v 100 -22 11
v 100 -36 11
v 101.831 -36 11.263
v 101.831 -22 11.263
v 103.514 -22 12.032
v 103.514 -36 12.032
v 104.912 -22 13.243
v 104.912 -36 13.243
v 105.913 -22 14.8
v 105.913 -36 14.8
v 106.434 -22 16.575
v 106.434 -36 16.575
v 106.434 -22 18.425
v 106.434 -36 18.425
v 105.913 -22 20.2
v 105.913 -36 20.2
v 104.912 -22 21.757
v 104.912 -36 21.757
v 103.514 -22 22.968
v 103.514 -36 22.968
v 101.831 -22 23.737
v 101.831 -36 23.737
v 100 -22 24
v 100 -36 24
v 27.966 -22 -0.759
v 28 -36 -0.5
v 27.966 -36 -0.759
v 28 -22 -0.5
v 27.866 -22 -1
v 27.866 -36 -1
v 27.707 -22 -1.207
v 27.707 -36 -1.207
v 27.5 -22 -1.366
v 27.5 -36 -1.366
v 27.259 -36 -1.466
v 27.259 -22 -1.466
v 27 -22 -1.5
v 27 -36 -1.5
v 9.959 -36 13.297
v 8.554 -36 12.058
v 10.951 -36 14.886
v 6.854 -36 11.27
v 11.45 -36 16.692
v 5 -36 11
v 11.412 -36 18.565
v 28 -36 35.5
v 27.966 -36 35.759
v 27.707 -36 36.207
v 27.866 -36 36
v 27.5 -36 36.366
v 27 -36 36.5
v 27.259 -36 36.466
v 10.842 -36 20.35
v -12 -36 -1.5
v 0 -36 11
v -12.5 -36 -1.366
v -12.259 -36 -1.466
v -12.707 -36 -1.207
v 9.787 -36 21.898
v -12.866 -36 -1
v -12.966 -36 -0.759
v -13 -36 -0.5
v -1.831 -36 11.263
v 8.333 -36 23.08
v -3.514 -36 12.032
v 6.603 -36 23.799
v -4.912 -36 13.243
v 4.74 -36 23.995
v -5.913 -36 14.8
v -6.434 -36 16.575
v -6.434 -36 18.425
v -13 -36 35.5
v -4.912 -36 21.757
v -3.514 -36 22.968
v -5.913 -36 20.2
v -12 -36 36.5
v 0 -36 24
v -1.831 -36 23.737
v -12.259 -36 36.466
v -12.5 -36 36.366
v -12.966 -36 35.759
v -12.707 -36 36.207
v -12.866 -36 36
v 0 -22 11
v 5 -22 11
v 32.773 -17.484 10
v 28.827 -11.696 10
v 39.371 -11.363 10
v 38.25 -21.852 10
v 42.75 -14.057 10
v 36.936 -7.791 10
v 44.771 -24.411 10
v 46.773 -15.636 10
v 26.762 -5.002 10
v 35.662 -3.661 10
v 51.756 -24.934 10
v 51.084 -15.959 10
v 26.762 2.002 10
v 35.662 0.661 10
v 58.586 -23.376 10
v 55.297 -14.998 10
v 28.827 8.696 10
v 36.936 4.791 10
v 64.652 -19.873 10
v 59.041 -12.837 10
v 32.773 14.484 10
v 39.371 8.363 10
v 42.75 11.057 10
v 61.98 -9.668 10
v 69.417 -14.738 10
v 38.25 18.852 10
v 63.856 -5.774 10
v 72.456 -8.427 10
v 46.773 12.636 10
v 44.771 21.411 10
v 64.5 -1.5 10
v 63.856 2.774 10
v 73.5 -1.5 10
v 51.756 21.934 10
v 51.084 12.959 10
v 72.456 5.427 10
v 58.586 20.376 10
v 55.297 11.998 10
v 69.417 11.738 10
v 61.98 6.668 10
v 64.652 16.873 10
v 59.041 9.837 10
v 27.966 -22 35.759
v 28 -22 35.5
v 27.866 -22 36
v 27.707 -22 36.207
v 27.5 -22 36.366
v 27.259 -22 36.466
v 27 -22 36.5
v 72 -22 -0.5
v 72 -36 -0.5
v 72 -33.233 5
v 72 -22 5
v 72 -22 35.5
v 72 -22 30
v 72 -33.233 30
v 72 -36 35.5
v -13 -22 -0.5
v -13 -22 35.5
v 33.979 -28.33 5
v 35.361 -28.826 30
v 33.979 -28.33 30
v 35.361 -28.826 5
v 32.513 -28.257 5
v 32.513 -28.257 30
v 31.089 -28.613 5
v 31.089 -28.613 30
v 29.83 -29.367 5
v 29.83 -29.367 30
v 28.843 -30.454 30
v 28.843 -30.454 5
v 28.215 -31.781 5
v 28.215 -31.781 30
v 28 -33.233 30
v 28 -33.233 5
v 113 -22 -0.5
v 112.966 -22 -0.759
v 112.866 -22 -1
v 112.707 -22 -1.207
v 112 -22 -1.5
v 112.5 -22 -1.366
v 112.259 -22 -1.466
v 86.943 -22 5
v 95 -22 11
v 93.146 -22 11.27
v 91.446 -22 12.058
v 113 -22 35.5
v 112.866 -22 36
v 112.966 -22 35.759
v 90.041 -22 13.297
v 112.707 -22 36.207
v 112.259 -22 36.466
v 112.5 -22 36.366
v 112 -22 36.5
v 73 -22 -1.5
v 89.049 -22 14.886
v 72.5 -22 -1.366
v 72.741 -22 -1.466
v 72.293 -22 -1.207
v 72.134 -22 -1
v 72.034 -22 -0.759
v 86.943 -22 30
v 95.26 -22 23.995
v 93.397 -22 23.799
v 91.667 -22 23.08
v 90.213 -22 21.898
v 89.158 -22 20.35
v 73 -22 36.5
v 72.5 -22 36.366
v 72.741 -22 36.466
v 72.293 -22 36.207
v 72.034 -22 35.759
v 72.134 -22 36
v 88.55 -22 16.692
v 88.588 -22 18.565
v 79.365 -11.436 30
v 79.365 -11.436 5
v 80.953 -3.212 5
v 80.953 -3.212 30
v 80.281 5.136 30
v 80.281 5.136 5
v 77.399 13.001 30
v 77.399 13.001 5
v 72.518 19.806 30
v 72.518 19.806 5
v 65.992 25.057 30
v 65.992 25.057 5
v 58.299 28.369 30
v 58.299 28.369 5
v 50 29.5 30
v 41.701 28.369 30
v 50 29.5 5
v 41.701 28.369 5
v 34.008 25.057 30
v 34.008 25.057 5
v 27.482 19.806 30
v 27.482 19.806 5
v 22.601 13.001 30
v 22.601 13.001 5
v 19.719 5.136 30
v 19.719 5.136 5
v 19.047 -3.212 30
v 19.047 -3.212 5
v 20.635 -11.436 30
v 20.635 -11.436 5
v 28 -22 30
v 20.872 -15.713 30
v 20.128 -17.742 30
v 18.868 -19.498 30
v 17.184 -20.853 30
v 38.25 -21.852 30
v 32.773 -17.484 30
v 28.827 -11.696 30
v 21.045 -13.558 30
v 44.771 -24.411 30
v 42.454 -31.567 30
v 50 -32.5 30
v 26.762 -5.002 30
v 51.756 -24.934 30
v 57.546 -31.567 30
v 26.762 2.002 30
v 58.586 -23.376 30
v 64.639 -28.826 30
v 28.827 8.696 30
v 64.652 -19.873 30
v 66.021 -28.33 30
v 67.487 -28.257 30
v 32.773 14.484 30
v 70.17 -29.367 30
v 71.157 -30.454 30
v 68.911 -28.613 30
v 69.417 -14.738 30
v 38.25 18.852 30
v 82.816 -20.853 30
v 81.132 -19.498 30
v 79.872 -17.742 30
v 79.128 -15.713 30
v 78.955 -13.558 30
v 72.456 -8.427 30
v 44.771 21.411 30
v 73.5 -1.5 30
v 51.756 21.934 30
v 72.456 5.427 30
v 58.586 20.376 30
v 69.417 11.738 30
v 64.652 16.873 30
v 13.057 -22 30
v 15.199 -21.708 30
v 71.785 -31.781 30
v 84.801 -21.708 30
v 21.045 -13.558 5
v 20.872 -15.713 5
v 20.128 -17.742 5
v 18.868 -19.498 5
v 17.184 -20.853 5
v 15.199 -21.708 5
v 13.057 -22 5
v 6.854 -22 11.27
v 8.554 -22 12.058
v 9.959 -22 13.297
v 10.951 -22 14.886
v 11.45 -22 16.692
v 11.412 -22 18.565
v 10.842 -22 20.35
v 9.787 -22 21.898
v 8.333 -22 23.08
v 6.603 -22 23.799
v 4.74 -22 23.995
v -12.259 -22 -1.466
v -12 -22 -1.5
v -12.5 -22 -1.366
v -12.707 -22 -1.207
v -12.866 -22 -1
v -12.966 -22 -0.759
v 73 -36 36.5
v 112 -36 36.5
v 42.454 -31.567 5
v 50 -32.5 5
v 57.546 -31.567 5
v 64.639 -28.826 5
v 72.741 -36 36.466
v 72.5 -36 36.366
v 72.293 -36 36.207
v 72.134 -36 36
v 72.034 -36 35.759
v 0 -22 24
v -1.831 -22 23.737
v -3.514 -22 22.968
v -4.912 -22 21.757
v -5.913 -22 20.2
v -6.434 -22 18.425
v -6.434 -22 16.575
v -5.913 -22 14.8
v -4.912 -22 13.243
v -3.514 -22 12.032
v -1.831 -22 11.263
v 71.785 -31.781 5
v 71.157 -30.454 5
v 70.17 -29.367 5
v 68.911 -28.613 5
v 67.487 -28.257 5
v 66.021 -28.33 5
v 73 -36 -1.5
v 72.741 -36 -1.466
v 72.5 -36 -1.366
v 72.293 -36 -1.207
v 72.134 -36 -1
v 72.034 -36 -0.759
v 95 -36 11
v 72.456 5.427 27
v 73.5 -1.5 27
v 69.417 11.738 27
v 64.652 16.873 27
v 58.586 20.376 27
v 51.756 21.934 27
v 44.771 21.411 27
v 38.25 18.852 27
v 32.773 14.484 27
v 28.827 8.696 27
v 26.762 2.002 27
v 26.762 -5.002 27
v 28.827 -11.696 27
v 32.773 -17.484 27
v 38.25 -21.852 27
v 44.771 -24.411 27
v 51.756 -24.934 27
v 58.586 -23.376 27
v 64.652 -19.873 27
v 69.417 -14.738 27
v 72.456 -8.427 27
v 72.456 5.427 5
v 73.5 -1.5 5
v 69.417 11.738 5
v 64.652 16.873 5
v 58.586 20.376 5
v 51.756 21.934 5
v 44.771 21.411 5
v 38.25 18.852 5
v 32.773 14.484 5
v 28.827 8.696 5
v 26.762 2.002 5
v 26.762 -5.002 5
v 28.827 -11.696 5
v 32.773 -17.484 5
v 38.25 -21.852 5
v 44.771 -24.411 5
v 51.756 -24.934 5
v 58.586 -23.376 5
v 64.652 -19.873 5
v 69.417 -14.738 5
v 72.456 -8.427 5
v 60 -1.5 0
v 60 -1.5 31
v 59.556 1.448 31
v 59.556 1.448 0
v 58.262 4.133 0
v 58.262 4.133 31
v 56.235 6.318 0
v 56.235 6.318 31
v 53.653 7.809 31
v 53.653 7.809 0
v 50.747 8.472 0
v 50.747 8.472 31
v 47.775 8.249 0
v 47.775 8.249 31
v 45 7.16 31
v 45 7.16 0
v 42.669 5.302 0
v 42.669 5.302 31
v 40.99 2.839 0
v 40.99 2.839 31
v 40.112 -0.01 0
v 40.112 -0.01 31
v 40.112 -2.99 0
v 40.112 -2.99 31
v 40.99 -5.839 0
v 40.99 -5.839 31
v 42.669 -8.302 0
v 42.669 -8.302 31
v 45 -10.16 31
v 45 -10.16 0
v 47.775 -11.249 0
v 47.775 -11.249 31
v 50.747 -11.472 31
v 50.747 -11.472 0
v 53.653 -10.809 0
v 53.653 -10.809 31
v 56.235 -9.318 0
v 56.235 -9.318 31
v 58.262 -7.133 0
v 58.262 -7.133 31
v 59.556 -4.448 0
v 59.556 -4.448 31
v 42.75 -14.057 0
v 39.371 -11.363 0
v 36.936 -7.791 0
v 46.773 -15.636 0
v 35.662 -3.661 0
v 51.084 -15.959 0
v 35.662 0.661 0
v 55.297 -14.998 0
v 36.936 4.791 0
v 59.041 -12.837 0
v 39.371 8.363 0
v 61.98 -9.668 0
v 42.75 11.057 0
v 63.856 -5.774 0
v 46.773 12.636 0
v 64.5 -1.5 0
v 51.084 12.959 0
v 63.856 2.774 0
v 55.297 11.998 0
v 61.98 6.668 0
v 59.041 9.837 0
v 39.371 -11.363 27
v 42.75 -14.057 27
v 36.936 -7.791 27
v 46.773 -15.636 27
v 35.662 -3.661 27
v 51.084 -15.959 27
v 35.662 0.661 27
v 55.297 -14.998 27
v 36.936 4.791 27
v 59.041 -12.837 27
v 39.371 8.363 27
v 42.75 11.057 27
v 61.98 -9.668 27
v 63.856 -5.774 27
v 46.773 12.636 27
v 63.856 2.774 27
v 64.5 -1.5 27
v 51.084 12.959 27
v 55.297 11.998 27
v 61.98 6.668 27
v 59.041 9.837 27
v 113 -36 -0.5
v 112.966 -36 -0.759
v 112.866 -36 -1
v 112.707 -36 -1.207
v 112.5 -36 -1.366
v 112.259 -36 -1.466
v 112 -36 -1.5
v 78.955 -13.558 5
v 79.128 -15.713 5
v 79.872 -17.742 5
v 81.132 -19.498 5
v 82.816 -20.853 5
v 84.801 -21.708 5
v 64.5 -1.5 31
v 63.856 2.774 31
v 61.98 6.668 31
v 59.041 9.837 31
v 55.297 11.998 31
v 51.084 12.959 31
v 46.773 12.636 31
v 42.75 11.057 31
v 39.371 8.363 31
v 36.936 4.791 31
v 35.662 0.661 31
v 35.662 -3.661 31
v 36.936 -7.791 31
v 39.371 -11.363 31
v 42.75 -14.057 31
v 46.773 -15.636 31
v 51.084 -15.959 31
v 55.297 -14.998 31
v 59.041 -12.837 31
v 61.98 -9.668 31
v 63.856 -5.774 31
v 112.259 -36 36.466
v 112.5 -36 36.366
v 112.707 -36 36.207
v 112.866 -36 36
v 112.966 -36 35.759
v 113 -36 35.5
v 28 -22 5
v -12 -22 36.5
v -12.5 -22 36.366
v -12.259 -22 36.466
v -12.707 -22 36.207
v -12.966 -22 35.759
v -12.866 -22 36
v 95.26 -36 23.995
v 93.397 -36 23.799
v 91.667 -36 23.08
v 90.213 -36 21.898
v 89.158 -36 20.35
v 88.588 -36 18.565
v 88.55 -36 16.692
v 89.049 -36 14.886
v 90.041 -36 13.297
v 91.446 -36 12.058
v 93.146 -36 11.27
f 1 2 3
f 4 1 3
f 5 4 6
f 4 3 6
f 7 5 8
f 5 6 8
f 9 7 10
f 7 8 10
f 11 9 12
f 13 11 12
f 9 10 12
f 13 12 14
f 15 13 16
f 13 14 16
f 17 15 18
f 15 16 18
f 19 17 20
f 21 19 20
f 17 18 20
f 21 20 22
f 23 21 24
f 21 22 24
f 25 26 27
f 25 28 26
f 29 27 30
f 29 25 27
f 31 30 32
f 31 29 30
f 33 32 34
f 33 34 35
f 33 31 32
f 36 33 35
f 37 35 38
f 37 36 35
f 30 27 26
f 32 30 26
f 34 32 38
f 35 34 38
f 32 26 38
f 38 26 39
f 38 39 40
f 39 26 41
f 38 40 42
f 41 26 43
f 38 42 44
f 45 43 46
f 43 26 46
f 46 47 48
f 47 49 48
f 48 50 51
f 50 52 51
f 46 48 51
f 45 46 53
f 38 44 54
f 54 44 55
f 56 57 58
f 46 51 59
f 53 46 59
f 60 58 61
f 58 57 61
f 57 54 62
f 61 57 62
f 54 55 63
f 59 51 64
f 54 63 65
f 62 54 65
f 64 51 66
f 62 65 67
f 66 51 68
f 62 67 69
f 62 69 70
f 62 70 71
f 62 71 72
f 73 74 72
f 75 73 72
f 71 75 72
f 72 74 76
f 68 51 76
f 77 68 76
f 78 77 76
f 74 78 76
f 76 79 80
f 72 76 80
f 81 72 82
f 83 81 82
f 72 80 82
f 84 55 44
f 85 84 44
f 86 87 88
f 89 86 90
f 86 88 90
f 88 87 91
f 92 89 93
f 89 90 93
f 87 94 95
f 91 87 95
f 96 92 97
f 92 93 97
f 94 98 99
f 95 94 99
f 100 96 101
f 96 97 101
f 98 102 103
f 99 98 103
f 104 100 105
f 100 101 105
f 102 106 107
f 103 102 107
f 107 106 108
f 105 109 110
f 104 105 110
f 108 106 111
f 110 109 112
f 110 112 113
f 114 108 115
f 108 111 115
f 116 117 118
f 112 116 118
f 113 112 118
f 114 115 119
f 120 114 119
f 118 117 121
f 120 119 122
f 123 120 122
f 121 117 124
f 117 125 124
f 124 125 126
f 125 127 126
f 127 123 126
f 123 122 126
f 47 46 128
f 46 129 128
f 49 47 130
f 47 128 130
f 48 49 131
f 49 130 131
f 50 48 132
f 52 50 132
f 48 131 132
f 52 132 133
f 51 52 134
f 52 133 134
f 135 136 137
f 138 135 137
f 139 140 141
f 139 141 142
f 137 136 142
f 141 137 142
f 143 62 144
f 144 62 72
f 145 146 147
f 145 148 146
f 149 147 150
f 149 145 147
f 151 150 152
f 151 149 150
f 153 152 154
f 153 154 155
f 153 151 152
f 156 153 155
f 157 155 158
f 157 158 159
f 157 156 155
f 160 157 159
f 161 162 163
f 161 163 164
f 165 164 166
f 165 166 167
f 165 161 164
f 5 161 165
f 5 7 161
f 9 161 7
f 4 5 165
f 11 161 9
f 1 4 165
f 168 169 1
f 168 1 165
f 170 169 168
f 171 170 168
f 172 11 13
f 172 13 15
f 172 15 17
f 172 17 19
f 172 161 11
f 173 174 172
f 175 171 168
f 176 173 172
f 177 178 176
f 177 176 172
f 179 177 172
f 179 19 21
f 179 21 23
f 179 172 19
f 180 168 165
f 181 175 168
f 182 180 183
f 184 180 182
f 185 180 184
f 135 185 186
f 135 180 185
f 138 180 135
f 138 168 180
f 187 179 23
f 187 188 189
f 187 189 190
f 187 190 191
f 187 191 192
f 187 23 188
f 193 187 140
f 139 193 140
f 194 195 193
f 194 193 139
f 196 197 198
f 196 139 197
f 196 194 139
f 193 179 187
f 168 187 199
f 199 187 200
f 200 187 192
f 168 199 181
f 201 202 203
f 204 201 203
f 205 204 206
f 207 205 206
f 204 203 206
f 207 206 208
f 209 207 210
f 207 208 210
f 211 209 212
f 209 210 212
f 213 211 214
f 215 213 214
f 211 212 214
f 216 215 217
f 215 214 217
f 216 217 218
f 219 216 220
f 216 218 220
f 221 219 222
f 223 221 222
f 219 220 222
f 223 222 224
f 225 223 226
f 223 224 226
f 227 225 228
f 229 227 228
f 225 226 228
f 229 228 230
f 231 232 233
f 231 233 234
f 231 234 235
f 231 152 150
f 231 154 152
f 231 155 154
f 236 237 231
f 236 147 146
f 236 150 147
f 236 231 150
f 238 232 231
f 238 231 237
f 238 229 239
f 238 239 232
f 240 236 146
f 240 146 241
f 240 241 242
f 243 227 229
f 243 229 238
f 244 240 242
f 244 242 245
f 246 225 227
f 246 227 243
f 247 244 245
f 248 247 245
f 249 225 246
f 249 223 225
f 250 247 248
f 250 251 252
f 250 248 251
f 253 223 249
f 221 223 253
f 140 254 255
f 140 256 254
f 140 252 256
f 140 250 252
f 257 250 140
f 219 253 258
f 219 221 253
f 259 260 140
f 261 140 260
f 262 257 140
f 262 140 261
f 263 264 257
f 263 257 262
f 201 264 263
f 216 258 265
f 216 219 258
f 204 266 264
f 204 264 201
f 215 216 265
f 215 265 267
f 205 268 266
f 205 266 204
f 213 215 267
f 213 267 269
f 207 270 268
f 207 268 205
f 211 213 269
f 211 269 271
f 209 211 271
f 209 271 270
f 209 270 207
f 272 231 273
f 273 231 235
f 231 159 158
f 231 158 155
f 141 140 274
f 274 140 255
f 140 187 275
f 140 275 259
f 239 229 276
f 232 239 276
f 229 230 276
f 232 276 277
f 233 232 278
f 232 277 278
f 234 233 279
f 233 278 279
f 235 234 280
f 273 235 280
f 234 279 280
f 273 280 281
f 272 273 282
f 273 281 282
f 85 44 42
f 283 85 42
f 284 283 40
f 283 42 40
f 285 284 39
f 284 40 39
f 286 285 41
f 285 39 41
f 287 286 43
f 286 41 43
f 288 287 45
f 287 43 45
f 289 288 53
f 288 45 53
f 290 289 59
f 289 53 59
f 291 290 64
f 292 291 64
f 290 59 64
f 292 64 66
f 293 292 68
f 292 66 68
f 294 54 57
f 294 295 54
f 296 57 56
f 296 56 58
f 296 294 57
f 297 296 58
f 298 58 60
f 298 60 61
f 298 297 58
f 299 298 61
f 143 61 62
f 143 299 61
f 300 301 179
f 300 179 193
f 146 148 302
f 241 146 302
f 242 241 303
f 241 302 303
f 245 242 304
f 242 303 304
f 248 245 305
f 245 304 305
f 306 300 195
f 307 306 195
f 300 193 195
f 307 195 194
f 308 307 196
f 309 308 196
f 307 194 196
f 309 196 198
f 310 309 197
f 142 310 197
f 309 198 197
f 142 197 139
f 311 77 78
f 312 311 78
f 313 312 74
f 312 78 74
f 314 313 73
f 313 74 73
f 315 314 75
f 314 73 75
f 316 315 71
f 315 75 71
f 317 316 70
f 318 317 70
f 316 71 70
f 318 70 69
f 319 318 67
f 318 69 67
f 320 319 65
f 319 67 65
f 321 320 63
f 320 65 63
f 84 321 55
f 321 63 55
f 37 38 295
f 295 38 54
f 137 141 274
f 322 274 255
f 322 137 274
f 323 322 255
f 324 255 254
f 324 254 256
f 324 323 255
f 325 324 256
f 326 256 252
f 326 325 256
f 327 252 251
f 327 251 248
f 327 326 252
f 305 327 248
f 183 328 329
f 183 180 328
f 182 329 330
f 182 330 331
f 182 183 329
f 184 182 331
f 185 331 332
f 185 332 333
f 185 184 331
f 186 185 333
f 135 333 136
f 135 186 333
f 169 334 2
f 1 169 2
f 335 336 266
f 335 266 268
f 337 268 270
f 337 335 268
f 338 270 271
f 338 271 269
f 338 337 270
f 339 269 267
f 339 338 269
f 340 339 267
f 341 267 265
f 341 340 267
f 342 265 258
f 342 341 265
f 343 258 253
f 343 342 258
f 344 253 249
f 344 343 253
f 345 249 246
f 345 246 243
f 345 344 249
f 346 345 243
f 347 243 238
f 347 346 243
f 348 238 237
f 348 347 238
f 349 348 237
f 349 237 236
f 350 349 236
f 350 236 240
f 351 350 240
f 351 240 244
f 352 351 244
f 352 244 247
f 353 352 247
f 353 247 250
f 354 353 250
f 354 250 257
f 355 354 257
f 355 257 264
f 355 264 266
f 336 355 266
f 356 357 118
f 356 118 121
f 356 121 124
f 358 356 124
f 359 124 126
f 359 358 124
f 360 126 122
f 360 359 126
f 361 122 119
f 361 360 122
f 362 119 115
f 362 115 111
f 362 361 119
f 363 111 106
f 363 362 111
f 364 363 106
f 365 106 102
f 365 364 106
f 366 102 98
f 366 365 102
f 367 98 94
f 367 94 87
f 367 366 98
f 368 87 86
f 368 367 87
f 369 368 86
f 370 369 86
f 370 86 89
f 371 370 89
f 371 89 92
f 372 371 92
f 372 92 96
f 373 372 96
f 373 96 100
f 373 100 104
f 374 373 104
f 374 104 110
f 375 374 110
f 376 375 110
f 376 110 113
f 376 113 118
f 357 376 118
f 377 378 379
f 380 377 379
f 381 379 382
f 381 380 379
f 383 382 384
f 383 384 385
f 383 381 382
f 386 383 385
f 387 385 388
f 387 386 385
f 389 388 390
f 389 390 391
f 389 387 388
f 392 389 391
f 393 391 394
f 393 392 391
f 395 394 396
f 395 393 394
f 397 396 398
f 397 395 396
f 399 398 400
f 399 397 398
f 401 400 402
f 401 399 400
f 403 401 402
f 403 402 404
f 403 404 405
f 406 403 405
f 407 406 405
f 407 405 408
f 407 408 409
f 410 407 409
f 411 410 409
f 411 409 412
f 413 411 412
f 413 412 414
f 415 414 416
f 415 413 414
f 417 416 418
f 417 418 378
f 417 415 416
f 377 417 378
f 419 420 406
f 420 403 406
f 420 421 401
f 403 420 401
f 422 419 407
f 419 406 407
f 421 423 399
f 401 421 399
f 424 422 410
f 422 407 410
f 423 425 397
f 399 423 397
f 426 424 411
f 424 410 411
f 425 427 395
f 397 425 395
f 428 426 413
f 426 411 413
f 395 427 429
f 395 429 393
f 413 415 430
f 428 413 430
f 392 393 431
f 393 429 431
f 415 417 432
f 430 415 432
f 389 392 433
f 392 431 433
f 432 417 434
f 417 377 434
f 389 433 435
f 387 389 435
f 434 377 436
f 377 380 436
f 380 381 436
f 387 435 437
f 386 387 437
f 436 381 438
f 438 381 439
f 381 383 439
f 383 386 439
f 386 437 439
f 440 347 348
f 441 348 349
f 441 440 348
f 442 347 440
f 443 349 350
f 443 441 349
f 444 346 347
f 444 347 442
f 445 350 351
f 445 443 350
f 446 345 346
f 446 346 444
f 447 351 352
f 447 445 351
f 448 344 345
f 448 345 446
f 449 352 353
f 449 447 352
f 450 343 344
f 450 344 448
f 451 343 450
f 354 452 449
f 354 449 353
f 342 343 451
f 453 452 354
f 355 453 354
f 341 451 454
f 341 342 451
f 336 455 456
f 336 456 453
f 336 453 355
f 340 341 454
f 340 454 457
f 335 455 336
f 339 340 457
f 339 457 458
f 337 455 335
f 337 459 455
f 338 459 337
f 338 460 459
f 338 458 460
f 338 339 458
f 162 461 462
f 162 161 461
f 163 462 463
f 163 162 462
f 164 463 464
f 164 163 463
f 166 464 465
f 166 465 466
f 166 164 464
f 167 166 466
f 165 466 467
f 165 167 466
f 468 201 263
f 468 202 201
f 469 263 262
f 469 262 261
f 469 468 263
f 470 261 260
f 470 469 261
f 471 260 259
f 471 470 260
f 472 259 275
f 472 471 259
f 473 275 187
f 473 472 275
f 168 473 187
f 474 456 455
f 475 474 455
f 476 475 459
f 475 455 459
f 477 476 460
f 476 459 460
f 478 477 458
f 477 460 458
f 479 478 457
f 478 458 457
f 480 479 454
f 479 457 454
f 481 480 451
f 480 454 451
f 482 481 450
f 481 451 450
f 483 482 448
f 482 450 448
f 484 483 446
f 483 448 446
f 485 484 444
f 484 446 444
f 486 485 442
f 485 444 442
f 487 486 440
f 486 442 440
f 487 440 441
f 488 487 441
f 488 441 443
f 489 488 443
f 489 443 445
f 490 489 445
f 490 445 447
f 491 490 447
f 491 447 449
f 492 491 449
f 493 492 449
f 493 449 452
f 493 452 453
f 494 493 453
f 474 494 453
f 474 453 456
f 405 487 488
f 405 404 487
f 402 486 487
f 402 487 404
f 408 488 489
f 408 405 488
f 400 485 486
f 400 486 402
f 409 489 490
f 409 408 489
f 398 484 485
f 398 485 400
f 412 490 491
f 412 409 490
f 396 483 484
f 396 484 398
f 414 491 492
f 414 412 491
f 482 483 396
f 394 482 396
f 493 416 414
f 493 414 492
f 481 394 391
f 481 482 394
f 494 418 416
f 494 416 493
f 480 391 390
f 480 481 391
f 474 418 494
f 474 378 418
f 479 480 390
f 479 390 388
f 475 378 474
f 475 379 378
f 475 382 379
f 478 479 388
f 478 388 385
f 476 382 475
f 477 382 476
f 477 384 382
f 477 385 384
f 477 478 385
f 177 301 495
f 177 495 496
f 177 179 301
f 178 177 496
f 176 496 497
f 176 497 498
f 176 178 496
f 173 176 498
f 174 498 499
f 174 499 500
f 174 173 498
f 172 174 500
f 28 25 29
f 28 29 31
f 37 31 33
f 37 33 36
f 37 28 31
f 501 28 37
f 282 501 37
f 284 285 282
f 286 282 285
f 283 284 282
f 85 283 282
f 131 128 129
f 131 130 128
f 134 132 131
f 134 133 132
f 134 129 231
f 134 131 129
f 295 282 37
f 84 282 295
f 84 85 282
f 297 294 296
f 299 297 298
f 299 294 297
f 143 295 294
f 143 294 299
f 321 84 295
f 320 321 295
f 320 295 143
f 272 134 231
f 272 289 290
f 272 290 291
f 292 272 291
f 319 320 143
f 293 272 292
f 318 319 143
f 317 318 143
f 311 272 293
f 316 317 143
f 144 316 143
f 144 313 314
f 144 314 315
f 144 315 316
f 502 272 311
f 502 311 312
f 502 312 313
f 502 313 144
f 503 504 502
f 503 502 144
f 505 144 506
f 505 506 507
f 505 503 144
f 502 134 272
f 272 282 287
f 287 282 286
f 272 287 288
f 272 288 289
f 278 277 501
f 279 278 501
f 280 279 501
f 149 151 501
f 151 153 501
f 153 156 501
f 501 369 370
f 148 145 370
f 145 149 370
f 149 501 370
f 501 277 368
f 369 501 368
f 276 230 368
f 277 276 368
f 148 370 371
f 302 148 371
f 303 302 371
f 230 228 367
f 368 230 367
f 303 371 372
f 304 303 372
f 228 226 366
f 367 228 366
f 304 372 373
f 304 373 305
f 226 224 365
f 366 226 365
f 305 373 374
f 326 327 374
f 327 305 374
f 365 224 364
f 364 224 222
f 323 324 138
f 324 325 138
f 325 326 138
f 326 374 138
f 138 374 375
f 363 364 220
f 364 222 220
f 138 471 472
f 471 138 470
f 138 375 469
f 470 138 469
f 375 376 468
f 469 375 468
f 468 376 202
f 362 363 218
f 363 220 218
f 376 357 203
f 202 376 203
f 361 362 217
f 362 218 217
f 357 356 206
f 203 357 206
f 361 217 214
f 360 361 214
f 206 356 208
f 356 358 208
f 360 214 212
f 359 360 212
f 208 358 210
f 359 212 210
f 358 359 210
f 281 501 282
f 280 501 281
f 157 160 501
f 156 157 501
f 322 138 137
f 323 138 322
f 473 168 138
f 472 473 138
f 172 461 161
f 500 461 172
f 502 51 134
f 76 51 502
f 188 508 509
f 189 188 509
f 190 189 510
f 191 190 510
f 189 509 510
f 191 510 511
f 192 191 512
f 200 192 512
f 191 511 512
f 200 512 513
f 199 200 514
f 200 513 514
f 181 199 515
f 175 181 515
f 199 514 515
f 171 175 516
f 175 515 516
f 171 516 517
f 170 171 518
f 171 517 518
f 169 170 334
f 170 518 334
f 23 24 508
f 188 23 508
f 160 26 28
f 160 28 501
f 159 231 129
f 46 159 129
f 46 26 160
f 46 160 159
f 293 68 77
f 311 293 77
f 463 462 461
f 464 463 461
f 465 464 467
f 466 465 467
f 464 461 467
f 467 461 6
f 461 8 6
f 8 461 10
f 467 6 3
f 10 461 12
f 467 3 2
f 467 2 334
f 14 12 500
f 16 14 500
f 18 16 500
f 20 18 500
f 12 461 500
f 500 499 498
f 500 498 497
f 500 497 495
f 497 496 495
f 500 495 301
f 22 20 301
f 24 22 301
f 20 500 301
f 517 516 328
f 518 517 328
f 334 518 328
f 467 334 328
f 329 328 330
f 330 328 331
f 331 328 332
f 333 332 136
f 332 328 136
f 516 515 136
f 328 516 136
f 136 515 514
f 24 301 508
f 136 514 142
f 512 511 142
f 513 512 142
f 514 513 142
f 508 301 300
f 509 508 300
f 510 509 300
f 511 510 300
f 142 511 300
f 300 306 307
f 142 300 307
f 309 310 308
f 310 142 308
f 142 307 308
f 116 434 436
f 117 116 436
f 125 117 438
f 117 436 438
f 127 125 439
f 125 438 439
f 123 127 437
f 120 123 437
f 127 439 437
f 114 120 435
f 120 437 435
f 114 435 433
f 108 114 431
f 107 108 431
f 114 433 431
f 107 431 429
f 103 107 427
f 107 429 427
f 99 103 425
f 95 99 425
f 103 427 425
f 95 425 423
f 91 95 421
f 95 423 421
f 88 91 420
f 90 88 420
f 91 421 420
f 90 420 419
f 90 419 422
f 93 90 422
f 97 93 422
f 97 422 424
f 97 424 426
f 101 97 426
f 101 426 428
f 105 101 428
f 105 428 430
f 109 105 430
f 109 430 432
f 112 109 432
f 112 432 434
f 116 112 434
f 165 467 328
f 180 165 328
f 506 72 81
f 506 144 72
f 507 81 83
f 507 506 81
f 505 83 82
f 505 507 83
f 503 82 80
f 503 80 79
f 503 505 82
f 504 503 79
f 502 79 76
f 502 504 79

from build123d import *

# Parameters (mm, degrees)
SKETCH_8_R      = 14.5
SKETCH_8_R_2    = 10
EXTRUDE_1_DEPTH = 31
SKETCH_10_R     = 23.5
SKETCH_10_R_2   = 14.5
EXTRUDE_2_DEPTH = 17
EXTRUDE_START   = -5
SKETCH_11_R     = 31
SKETCH_11_R_2   = 23.5
EXTRUDE_3_DEPTH = 25
SKETCH_13_W     = 41
SKETCH_13_H     = 38
EXTRUDE_4_DEPTH = 14
FILLET_1_R      = 8
FILLET_2_R      = 5
FILLET_3_R      = 5
FILLET_4_R      = 8
FILLET_5_R      = 1
FILLET_6_R      = 1


with BuildPart() as part:
    # Эскиз8 → Вытянуть1 (new body)
    with BuildSketch(Plane.XY):
        with Locations((50, -1.5)):
            Circle(SKETCH_8_R)
        with Locations((50, -1.5)):
            Circle(SKETCH_8_R_2, mode=Mode.SUBTRACT)
    extrude(amount=EXTRUDE_1_DEPTH)

    # Эскиз10 → Вытянуть2 (add)
    with BuildSketch(Plane.XY.offset(10)):
        with Locations((50, -1.5)):
            Circle(SKETCH_10_R)
        with Locations((50, -1.5)):
            Circle(SKETCH_10_R_2, mode=Mode.SUBTRACT)
    extrude(amount=EXTRUDE_2_DEPTH)

    # Эскиз11 → Вытянуть3 (add)
    with BuildSketch(Plane.XY.offset(10).offset(EXTRUDE_START)):
        with Locations((50, -1.5)):
            Circle(SKETCH_11_R)
        with Locations((50, -1.5)):
            Circle(SKETCH_11_R_2, mode=Mode.SUBTRACT)
    extrude(amount=EXTRUDE_3_DEPTH)

    # Эскиз13 → Вытянуть4 (add)
    # profile 1 of 2: a face of its own
    with BuildSketch(Plane(origin=(0, -36, 0), x_dir=(-1, 0, 0), z_dir=(0, 1, 0))):
        with Locations((-7.5, 17.5)):
            Rectangle(SKETCH_13_W, SKETCH_13_H)
        with BuildLine():
            Line((-4.740103958, 23.994802079), (0, 24))
            ThreePointArc((0, 24), (6.5, 17.5), (0, 11))
            Line((0, 11), (-5, 11))
            ThreePointArc((-5, 11), (-11.49870039, 17.629974008), (-4.740103958, 23.994802079))
        make_face(mode=Mode.SUBTRACT)
    # profile 2 of 2: a face of its own
    with BuildSketch(Plane(origin=(0, -36, 0), x_dir=(-1, 0, 0), z_dir=(0, 1, 0))):
        with Locations((-92.5, 17.5)):
            Rectangle(SKETCH_13_W, SKETCH_13_H)
        with BuildLine():
            Line((-95, 11), (-100, 11))
            ThreePointArc((-100, 11), (-106.5, 17.5), (-100, 24))
            Line((-100, 24), (-95.259896042, 23.994802079))
            ThreePointArc((-95.259896042, 23.994802079), (-88.50129961, 17.629974008), (-95, 11))
        make_face(mode=Mode.SUBTRACT)
    extrude(amount=EXTRUDE_4_DEPTH)

    # Скругление1
    fillet_1_edges = [part.edges().sort_by_distance(p)[0] for p in [
        (26.745968092, -22, 17.5),
    ]]
    fillet(fillet_1_edges, radius=FILLET_1_R)

    # Скругление2
    fillet_2_edges = [part.edges().sort_by_distance(p)[0] for p in [
        (28, -23.340329668, 17.5),
    ]]
    fillet(fillet_2_edges, radius=FILLET_2_R)

    # Скругление3
    fillet_3_edges = [part.edges().sort_by_distance(p)[0] for p in [
        (72, -23.340329668, 17.5),
    ]]
    fillet(fillet_3_edges, radius=FILLET_3_R)

    # Скругление4
    fillet_4_edges = [part.edges().sort_by_distance(p)[0] for p in [
        (73.254031908, -22, 17.5),
    ]]
    fillet(fillet_4_edges, radius=FILLET_4_R)

    # Скругление5
    fillet_5_edges = [part.edges().sort_by_distance(p)[0] for p in [
        (28, -29, 36.5),
        (28, -29, -1.5),
        (72, -29, -1.5),
        (72, -29, 36.5),
    ]]
    fillet(fillet_5_edges, radius=FILLET_5_R)

    # Скругление6
    fillet_6_edges = [part.edges().sort_by_distance(p)[0] for p in [
        (-13, -29, -1.5),
        (-13, -29, 36.5),
        (113, -29, 36.5),
        (113, -29, -1.5),
    ]]
    fillet(fillet_6_edges, radius=FILLET_6_R)


solid = part.part
